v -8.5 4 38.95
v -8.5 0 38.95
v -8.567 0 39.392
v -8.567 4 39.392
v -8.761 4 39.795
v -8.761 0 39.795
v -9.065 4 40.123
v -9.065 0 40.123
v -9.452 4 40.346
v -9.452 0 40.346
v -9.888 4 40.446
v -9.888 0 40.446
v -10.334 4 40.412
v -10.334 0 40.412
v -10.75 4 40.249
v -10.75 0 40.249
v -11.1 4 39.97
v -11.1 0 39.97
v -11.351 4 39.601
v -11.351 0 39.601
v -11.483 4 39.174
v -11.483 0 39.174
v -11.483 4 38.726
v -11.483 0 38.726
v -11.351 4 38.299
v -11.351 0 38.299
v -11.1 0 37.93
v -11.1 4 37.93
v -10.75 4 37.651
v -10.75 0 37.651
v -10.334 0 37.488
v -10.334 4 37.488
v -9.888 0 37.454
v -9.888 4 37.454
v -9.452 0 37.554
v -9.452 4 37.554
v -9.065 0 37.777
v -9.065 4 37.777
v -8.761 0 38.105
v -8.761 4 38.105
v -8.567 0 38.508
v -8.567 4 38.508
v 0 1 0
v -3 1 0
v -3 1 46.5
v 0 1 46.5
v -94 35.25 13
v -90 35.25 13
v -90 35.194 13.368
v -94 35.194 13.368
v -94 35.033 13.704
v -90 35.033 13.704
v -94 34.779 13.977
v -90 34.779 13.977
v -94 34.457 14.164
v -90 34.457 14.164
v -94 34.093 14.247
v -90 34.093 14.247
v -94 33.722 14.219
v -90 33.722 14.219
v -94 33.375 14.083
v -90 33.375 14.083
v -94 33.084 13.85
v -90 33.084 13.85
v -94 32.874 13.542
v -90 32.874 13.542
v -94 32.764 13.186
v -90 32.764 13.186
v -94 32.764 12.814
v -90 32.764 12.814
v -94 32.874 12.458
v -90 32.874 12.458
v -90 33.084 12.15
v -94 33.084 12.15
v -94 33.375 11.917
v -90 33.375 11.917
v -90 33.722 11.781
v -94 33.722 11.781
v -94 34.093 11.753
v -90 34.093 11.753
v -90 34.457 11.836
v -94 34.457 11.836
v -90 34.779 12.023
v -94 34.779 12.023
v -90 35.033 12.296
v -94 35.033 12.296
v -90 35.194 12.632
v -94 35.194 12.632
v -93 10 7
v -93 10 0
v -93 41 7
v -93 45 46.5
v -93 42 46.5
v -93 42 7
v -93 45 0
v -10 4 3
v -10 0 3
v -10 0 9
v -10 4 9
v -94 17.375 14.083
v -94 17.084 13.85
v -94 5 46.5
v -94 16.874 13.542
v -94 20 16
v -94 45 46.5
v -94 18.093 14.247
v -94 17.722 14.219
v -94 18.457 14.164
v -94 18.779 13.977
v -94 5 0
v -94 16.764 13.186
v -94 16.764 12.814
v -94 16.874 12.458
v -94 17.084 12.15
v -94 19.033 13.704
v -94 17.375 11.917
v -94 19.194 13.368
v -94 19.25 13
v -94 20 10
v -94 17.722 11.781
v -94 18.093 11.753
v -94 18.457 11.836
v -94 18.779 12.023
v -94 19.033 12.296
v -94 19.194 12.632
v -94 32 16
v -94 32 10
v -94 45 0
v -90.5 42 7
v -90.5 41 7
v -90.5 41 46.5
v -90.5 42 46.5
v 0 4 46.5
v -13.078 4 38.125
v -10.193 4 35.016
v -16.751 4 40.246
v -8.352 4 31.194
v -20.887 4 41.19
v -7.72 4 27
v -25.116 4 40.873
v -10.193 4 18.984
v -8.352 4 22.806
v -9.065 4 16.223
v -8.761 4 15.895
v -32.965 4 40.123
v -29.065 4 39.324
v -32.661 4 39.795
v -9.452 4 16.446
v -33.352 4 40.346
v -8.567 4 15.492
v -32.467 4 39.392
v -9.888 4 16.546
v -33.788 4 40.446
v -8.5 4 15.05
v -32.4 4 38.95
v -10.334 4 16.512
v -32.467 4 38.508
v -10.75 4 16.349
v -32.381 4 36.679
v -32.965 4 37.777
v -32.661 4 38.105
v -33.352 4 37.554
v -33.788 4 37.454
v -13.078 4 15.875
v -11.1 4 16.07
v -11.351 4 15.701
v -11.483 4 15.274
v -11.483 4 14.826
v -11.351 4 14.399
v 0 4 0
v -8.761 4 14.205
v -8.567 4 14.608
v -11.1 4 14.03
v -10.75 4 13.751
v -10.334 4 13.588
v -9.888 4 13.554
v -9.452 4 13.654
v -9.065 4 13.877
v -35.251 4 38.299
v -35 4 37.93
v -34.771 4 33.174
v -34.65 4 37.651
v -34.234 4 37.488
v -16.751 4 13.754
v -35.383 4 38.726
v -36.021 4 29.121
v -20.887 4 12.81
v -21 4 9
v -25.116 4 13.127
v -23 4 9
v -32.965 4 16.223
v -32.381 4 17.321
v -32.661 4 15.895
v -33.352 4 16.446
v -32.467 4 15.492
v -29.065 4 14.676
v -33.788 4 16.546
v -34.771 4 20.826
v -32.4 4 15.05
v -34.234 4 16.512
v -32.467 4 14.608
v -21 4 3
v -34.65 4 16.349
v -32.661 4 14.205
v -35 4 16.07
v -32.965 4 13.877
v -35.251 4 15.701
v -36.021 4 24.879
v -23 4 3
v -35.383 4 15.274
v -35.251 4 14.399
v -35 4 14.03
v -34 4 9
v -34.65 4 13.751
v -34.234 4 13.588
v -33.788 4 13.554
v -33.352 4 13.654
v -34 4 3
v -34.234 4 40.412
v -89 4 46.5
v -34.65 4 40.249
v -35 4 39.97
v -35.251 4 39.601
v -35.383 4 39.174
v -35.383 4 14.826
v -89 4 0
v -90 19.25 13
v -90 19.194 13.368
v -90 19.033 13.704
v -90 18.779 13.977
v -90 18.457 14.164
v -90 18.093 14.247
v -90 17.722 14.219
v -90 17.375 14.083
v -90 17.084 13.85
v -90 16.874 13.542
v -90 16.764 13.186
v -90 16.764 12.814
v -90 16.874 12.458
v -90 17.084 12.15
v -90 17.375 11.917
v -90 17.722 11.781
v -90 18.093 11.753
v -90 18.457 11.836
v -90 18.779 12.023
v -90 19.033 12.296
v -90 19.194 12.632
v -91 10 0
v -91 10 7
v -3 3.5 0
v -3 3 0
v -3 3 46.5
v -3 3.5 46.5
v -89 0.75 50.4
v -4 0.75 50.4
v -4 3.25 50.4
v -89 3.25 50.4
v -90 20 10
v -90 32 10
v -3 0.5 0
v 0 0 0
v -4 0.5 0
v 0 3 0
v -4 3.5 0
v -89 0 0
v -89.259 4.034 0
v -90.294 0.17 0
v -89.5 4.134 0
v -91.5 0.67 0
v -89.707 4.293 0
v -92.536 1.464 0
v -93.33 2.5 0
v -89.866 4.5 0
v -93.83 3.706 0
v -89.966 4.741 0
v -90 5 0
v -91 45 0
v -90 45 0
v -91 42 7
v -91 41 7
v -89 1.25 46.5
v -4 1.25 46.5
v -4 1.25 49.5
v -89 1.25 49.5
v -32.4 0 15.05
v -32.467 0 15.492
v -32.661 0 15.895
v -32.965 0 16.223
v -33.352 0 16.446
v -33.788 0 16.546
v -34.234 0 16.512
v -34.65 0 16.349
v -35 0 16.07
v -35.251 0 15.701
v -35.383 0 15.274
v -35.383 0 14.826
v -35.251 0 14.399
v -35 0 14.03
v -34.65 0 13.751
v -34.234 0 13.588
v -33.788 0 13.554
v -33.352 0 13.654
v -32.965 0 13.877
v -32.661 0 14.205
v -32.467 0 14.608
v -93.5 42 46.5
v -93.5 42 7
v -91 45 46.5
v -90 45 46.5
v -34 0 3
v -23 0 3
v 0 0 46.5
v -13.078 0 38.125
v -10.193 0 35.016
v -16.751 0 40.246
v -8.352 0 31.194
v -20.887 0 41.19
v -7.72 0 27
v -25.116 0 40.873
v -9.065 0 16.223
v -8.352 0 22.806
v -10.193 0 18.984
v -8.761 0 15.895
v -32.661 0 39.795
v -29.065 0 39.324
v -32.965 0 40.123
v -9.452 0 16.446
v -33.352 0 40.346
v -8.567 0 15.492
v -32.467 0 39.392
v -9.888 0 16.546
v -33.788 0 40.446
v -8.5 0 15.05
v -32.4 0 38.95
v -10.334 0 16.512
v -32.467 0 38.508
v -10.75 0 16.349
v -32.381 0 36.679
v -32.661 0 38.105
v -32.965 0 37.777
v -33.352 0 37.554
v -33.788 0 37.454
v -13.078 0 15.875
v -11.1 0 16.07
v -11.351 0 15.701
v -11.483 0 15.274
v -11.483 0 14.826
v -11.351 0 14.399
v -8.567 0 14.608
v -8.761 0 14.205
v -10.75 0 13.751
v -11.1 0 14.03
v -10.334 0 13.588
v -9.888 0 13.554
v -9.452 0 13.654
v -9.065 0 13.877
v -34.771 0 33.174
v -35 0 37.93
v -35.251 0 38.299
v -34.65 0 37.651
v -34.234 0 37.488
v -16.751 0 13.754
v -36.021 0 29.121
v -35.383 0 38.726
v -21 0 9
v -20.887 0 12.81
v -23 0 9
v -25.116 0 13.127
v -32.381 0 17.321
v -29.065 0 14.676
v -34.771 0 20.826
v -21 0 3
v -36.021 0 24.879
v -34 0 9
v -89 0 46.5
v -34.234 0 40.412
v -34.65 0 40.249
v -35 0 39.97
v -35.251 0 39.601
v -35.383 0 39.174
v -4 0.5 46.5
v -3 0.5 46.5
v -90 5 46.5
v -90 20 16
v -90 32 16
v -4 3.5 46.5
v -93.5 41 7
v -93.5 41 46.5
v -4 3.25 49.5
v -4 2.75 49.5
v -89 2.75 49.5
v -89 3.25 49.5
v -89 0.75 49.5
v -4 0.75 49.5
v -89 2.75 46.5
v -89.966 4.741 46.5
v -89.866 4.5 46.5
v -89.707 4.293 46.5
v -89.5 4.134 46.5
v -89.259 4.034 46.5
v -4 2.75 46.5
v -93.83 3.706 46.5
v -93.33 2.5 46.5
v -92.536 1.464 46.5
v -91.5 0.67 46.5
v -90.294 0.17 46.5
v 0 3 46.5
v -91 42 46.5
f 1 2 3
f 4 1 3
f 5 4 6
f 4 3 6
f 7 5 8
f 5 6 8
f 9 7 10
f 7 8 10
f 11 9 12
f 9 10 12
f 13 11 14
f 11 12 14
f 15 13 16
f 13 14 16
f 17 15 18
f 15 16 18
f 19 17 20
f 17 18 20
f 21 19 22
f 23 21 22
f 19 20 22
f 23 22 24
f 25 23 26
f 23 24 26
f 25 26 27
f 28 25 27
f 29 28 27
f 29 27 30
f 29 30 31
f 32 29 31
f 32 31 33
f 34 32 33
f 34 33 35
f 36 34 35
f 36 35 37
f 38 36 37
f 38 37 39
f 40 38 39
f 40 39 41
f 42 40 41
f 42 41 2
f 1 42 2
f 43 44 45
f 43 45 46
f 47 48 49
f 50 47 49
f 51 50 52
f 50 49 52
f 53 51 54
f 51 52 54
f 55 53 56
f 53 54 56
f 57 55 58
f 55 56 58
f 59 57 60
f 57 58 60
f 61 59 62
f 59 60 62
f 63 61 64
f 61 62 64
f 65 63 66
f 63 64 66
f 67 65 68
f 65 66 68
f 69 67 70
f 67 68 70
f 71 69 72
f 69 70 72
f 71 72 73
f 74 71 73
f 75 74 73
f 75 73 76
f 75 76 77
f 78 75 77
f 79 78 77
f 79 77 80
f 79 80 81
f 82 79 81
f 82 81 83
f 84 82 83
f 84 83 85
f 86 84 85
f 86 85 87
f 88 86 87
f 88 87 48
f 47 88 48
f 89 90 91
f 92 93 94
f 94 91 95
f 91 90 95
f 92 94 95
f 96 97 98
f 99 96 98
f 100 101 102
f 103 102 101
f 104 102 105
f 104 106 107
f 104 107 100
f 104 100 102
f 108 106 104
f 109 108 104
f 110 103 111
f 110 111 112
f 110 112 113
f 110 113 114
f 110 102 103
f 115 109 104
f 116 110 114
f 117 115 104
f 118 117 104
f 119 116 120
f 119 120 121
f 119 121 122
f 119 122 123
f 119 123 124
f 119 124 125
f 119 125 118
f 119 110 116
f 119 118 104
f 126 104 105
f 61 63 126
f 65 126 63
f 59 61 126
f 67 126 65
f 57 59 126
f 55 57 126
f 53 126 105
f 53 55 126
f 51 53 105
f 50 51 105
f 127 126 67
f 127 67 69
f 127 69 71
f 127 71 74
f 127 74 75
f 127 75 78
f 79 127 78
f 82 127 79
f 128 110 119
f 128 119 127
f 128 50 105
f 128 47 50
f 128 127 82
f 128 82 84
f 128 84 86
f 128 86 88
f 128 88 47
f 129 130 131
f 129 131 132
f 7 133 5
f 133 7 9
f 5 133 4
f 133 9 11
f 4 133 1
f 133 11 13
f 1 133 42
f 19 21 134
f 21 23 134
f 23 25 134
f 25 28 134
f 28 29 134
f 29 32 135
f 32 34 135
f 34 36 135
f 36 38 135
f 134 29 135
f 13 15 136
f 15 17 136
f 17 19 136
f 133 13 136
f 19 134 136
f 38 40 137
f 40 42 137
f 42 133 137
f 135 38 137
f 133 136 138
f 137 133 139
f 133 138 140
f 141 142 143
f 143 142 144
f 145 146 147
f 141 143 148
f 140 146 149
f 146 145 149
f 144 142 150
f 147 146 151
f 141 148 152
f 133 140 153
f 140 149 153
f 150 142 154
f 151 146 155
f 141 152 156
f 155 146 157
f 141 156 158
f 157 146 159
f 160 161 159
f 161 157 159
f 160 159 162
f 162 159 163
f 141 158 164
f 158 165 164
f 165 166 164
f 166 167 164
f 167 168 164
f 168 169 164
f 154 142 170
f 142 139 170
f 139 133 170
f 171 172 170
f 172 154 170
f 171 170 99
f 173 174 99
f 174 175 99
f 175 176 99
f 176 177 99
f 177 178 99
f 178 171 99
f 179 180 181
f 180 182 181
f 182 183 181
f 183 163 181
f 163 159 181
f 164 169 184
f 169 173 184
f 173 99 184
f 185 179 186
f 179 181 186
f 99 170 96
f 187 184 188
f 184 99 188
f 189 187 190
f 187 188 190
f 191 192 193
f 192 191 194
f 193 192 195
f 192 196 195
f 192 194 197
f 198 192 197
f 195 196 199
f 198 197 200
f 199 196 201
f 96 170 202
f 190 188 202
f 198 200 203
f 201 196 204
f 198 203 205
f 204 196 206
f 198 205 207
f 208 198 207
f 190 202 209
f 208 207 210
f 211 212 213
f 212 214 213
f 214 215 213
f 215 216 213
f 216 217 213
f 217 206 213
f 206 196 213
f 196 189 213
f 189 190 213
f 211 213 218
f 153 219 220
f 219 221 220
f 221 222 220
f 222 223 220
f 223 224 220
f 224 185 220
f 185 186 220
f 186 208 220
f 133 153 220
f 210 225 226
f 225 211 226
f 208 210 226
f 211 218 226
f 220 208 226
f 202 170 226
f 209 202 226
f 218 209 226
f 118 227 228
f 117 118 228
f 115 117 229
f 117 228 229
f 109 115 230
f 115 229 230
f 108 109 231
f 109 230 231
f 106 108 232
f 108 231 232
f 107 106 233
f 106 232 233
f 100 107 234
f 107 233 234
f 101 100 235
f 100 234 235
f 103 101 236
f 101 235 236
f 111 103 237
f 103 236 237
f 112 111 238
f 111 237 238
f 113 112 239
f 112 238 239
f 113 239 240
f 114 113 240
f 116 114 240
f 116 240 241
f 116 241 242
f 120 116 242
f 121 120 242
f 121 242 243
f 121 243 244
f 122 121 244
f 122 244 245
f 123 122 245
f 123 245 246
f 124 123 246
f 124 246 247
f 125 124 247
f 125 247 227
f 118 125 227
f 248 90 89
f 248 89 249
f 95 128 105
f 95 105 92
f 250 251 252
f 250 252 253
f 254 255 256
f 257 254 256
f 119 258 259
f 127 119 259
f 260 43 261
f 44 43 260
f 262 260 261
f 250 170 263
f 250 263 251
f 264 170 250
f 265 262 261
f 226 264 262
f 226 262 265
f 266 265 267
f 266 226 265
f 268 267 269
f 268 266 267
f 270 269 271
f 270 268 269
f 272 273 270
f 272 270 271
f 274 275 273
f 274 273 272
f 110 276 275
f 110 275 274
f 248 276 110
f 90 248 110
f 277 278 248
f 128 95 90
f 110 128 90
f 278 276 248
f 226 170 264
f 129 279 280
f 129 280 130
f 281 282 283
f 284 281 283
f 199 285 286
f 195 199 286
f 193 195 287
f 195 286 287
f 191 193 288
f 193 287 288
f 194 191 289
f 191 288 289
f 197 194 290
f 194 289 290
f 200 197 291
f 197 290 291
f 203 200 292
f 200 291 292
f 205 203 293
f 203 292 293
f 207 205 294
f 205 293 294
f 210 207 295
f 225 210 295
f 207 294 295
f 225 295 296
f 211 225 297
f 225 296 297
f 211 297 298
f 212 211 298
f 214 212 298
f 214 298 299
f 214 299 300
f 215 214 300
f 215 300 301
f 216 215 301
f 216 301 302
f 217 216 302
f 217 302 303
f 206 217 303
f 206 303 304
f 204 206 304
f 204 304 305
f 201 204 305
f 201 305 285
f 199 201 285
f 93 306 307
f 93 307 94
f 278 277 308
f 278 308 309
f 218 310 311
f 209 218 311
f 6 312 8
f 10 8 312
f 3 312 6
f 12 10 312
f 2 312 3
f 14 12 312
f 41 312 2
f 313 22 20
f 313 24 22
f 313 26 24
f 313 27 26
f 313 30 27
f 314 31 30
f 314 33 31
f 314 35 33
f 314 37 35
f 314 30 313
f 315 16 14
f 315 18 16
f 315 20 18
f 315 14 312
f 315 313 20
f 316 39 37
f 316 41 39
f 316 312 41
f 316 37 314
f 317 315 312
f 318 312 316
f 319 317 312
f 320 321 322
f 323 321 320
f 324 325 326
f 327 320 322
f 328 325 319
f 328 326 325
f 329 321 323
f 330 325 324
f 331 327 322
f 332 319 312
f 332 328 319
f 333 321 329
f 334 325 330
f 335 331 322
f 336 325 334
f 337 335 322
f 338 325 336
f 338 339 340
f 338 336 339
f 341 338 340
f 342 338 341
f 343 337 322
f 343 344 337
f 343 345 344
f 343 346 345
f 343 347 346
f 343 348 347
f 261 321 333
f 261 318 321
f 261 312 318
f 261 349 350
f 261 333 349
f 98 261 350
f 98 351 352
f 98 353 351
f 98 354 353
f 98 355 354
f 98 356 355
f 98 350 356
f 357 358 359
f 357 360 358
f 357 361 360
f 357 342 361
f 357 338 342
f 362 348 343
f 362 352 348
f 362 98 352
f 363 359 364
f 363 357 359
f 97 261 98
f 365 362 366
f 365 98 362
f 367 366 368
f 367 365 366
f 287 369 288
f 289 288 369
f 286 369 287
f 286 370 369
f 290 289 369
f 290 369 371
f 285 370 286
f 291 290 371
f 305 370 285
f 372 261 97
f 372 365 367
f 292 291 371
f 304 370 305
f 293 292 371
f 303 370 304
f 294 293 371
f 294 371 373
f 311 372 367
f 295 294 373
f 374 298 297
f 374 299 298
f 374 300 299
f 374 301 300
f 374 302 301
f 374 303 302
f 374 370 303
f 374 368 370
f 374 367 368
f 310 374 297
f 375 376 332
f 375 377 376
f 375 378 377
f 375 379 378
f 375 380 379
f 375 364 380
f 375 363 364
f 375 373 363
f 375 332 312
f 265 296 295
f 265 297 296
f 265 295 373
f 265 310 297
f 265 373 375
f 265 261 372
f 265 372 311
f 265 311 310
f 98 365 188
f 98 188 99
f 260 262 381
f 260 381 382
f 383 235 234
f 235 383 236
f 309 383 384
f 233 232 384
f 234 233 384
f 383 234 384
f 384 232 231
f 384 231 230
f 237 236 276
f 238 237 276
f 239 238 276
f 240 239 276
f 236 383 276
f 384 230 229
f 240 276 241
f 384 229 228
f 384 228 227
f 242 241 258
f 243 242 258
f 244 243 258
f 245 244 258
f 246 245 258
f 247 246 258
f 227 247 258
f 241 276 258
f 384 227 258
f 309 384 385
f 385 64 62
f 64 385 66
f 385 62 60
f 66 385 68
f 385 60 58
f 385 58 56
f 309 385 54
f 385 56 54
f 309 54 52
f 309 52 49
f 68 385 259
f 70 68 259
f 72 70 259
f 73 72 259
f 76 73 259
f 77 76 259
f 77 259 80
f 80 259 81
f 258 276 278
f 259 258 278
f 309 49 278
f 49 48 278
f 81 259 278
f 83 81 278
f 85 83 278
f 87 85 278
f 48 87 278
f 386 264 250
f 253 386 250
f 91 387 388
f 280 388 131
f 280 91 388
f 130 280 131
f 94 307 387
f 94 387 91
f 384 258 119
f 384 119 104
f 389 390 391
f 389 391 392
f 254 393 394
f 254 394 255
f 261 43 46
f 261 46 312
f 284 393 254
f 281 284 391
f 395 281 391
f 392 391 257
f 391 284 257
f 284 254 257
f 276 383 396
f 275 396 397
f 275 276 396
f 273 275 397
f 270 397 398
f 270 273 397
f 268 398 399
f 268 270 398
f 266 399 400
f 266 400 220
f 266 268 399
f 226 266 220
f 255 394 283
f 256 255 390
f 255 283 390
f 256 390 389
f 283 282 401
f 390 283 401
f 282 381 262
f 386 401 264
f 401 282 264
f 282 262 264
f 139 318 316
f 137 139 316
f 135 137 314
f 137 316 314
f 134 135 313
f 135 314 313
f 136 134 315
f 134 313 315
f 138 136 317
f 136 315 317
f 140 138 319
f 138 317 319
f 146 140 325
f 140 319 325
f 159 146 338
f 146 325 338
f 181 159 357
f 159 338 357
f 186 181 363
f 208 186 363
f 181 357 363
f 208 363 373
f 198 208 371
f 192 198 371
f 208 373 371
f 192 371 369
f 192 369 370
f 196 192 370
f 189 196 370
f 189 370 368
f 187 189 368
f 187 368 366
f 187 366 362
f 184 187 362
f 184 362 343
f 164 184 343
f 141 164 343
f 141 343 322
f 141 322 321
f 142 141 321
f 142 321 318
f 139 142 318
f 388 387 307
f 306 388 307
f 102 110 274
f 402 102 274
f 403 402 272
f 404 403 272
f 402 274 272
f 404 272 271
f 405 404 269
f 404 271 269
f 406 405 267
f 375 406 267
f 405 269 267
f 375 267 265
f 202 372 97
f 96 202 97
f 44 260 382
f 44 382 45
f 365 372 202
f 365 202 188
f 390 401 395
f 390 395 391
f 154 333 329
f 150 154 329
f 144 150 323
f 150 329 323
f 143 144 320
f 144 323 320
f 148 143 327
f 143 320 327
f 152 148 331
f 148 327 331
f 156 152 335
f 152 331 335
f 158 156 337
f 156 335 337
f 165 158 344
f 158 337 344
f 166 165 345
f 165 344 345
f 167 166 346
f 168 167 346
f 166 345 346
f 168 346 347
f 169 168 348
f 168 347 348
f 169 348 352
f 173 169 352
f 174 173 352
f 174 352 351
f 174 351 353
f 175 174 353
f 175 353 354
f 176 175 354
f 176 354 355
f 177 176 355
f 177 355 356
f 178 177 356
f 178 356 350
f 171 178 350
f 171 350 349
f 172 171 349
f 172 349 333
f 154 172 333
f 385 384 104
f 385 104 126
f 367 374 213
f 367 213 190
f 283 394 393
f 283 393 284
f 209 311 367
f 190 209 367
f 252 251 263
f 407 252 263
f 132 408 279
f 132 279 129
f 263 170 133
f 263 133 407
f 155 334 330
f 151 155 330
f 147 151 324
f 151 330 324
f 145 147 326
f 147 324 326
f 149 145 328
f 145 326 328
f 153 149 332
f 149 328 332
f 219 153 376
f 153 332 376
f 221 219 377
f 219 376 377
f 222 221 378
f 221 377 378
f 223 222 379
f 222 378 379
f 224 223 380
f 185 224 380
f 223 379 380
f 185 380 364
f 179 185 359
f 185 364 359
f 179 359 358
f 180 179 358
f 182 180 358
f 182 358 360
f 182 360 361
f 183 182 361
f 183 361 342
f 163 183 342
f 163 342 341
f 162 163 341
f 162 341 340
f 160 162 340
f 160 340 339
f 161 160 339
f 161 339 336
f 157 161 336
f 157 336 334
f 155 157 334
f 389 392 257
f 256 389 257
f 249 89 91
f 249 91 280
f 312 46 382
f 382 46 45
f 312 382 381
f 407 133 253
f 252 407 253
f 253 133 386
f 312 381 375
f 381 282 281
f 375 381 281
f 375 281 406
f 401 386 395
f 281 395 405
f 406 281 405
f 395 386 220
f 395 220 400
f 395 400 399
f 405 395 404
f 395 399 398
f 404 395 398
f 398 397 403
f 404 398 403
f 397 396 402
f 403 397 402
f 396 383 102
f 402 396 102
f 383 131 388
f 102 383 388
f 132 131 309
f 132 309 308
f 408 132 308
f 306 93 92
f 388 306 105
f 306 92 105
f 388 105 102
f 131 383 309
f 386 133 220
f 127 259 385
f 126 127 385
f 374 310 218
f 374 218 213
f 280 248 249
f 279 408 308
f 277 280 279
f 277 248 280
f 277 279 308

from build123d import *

# Parameters (mm, degrees)
PAD_DEPTH       = 46.5
SKETCH114_W     = 3
SKETCH114_H     = 2
SKETCH114_W_2   = 1
SKETCH114_H_2   = 3
POCKET_DEPTH    = 46.501
SKETCH116_R     = 14.23
SKETCH116_R_2   = 1.5
POCKET001_DEPTH = 5
SKETCH_W        = 2
SKETCH_H        = 35
POCKET002_DEPTH = 7
POCKET003_START = 7
SKETCH117_W     = 2
SKETCH117_H     = 3
SKETCH117_W_2   = 3
SKETCH117_H_2   = 1
POCKET003_DEPTH = 40
PAD001_START    = -4
SKETCH119_W     = 1.5
SKETCH119_H     = 3
SKETCH119_W_2   = 2.5
SKETCH119_H_2   = 0.9
PAD001_DEPTH    = 85
SKETCH118_R     = 1.25
SKETCH118_W     = 12
SKETCH118_H     = 6
POCKET004_DEPTH = 94.001
SKETCH120_W     = 11
SKETCH120_H     = 6
POCKET005_DEPTH = 5


with BuildPart() as part:
    # Sketch112 → Pad (new body)
    with BuildSketch(Plane.XY):
        with BuildLine():
            Line((0, 0), (-89, 0))
            ThreePointArc((-94, 5), (-92.535534, 1.464466), (-89, 0))
            Line((-94, 5), (-94, 45))
            Line((-94, 45), (-90, 45))
            Line((-90, 5), (-90, 45))
            ThreePointArc((-90, 5), (-89.707107, 4.292893), (-89, 4))
            Line((0, 4), (-89, 4))
            Line((0, 4), (0, 0))
        make_face()
    extrude(amount=PAD_DEPTH)

    # Sketch114 → Pocket (cut, through all)
    with BuildSketch(Plane.XY):
        with Locations((-1.5, 2)):
            Rectangle(SKETCH114_W, SKETCH114_H)
        with Locations((-3.5, 2)):
            Rectangle(SKETCH114_W_2, SKETCH114_H_2)
    extrude(amount=POCKET_DEPTH, mode=Mode.SUBTRACT)

    # Sketch116 → Pocket001 (cut)
    with BuildSketch(Plane.XZ):
        with Locations((-21.95, 27)):
            Circle(SKETCH116_R)
        with Locations((-10, 38.95)):
            Circle(SKETCH116_R_2)
        with Locations((-33.9, 38.95)):
            Circle(SKETCH116_R_2)
        with Locations((-33.9, 15.05)):
            Circle(SKETCH116_R_2)
        with Locations((-10, 15.05)):
            Circle(SKETCH116_R_2)
    extrude(amount=-POCKET001_DEPTH, mode=Mode.SUBTRACT)

    # Sketch → Pocket002 (cut)
    with BuildSketch(Plane.XY):
        with Locations((-92, 27.5)):
            Rectangle(SKETCH_W, SKETCH_H)
    extrude(amount=POCKET002_DEPTH, mode=Mode.SUBTRACT)

    # Sketch117 → Pocket003 (cut)
    with BuildSketch(Plane.XY.offset(POCKET003_START)):
        with Locations((-92, 43.5)):
            Rectangle(SKETCH117_W, SKETCH117_H)
        with Locations((-92, 41.5)):
            Rectangle(SKETCH117_W_2, SKETCH117_H_2)
    extrude(amount=POCKET003_DEPTH, mode=Mode.SUBTRACT)

    # Sketch119 → Pad001 (join)
    with BuildSketch(Plane.YZ.offset(PAD001_START)):
        with Locations((2, 48)):
            Rectangle(SKETCH119_W, SKETCH119_H)
        with Locations((2, 49.95)):
            Rectangle(SKETCH119_W_2, SKETCH119_H_2)
    extrude(amount=-PAD001_DEPTH)

    # Sketch118 → Pocket004 (cut, through all)
    with BuildSketch(Plane.YZ):
        with Locations((34, 13)):
            Circle(SKETCH118_R)
        with Locations((18, 13)):
            Circle(SKETCH118_R)
        with Locations((26, 13)):
            Rectangle(SKETCH118_W, SKETCH118_H)
    extrude(amount=-POCKET004_DEPTH, mode=Mode.SUBTRACT)

    # Sketch120 → Pocket005 (cut)
    with BuildSketch(Plane.XZ):
        with Locations((-15.5, 6)):
            Rectangle(SKETCH120_W, SKETCH120_H)
        with Locations((-28.5, 6)):
            Rectangle(SKETCH120_W, SKETCH120_H)
    extrude(amount=-POCKET005_DEPTH, mode=Mode.SUBTRACT)


solid = part.part
